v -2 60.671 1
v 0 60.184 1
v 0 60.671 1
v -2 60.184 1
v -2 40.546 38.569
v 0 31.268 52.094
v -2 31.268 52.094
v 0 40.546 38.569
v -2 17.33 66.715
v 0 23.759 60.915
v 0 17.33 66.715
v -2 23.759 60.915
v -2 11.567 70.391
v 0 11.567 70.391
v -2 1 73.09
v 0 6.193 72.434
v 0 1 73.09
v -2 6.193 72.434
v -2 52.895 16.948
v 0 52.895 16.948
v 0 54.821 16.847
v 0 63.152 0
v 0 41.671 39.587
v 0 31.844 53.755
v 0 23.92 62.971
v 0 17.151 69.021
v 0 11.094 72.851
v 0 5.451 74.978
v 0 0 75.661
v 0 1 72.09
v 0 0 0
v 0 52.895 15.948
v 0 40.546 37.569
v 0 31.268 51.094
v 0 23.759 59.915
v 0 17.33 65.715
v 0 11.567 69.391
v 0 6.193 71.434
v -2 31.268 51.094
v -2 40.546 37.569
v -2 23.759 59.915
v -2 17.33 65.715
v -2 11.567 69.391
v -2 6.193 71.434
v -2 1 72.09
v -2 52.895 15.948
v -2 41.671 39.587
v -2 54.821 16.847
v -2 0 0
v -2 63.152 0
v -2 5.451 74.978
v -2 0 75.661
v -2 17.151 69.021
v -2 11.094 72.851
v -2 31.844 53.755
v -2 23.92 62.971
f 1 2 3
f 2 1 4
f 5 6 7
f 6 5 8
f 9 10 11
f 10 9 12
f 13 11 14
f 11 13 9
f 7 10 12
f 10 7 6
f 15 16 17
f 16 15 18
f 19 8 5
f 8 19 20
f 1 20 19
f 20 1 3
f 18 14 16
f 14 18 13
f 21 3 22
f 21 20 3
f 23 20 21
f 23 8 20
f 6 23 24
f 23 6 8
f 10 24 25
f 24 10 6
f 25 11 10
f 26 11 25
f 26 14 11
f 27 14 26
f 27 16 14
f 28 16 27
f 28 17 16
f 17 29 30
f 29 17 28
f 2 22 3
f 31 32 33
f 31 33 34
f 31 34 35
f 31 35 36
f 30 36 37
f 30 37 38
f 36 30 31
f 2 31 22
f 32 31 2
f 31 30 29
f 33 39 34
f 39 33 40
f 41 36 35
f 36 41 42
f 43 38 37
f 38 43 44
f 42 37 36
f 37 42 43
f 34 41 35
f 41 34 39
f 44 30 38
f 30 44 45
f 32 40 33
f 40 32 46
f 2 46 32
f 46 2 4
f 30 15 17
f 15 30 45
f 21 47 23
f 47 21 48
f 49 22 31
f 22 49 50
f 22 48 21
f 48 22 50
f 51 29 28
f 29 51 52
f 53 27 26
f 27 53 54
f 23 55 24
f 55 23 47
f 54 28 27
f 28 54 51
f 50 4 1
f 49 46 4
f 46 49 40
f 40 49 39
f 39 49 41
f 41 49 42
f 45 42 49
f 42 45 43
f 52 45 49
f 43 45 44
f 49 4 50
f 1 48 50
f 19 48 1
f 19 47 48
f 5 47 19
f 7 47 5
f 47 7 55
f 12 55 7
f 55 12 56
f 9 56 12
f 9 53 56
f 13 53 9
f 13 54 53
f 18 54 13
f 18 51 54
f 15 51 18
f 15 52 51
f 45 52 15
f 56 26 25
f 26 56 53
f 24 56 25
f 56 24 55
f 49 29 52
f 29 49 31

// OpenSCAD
// file: ../../lightning-bolt.scad
// Module names are of the form poly_<inkscape-path-id>().  As a result,
// you can associate a polygon in this OpenSCAD program with the corresponding
// SVG element in the Inkscape document by looking for the XML element with
// the attribute id="inkscape-path-id".

// fudge value is used to ensure that subtracted solids are a tad taller
// in the z dimension than the polygon being subtracted from.  This helps
// keep the resulting .stl file manifold.
fudge = 0.1;

module poly_Selection(h)
{
  scale([25.4/90, -25.4/90, 1]) union()
  {
    difference()
    {
       linear_extrude(height=h)
         polygon([[-4.148906,-161.604375],[29.851094,-161.604375],[89.851094,-161.604375],[93.388594,-161.765625],[96.851094,-161.604375],[99.052539,-160.861992],[100.810781,-159.788437],[102.146680,-158.426602],[103.081094,-156.819375],[103.634883,-155.009648],[103.828906,-153.040312],[103.684023,-150.954258],[103.221094,-148.794375],[102.277969,-146.302969],[100.798594,-143.351250],[96.816094,-136.696875],[88.851094,-124.794375],[55.521094,-74.794375],[52.930781,-71.123125],[49.723594,-66.176875],[48.375586,-63.594766],[47.457656,-61.136875],[47.164570,-58.950859],[47.691094,-57.184375],[49.468281,-55.523281],[51.843594,-54.455625],[56.851094,-53.384375],[81.851094,-52.794375],[85.930117,-52.456934],[89.547656,-51.555469],[92.689414,-50.098770],[95.341094,-48.095625],[97.488398,-45.554824],[99.117031,-42.485156],[100.212695,-38.895410],[100.761094,-34.794375],[100.747676,-30.961406],[100.226250,-27.654375],[99.240059,-24.763594],[97.832344,-22.179375],[96.046348,-19.792031],[93.925313,-17.491875],[88.851094,-12.714375],[60.861094,11.495625],[22.681094,53.165625],[-2.148906,76.215625],[-46.148906,121.205625],[-78.148906,152.375625],[-81.104219,155.211094],[-84.541406,158.319375],[-88.282344,160.803281],[-90.211055,161.530723],[-92.148906,161.765625],[-94.372402,161.407539],[-95.966250,160.530312],[-97.010488,159.238242],[-97.585156,157.635625],[-97.770293,155.826758],[-97.645937,153.915937],[-96.788906,150.205625],[-93.919844,142.465000],[-90.396406,134.510625],[-82.908906,119.205625],[-44.898906,43.205625],[-36.378906,25.205625],[-35.345781,22.782813],[-34.608906,20.343125],[-34.494531,17.862187],[-35.328906,15.315625],[-36.170610,14.127329],[-37.254570,13.148945],[-40.029844,11.748437],[-43.415898,10.967148],[-47.173906,10.658125],[-54.850469,10.869062],[-61.148906,11.205625],[-84.148906,11.205625],[-89.537187,11.162031],[-95.852656,10.511875],[-98.777129,9.708848],[-101.236250,8.453594],[-102.997637,6.645918],[-103.544060,5.503611],[-103.828906,4.185625],[-103.551094,0.976250],[-102.416406,-2.454375],[-99.458906,-8.794375],[-87.568906,-34.794375],[-45.288906,-129.794375],[-36.368906,-149.794375],[-33.801406,-154.788125],[-32.116406,-157.068906],[-30.048906,-158.784375],[-27.055781,-159.877500],[-23.293906,-160.479375],[-16.148906,-160.794375],[-10.167656,-160.861875],[-4.148906,-161.604375]]);
       translate([0, 0, -fudge])
         linear_extrude(height=h+2*fudge)
           polygon([[-2.148906,-144.654375],[-11.515156,-143.585625],[-16.058125,-142.526719],[-18.163730,-141.618809],[-20.108906,-140.364375],[-22.284258,-138.120078],[-24.525469,-134.897500],[-28.966406,-126.644375],[-32.953594,-117.858750],[-36.008906,-110.794375],[-65.008906,-46.794375],[-77.008906,-20.794375],[-77.717656,-18.100625],[-78.111406,-14.919375],[-77.953906,-11.783125],[-77.594609,-10.398281],[-77.008906,-9.224375],[-75.949375,-8.181387],[-74.555156,-7.474844],[-71.118906,-6.800625],[-64.148906,-6.514375],[-25.148906,-5.794375],[-20.262344,-5.639844],[-17.686992,-5.320645],[-15.208906,-4.723125],[-12.967070,-3.759512],[-11.100469,-2.342031],[-9.748086,-0.382910],[-9.048906,2.205625],[-9.148008,3.888379],[-9.686094,6.060156],[-11.633906,11.216875],[-15.898906,20.205625],[-36.368906,61.205625],[-43.578906,78.205625],[-43.665156,80.649063],[-43.016406,82.798125],[-42.384766,83.660898],[-41.531406,84.328437],[-40.443672,84.760195],[-39.108906,84.915625],[-36.457187,84.283281],[-33.772656,82.729375],[-29.148906,78.915625],[-9.148906,59.205625],[54.851094,-4.794375],[69.851094,-20.794375],[73.011094,-24.875625],[74.145781,-27.247656],[74.401094,-29.684375],[74.109907,-30.624995],[73.529883,-31.442773],[71.644531,-32.745312],[69.027461,-33.663008],[65.961094,-34.266875],[59.610156,-34.817188],[54.851094,-34.964375],[26.851094,-34.964375],[24.944707,-35.570820],[23.266250,-36.420312],[21.835527,-37.498086],[20.672344,-38.789375],[19.796504,-40.279414],[19.227813,-41.953437],[18.986074,-43.796680],[19.091094,-45.794375],[19.653008,-47.792656],[20.785156,-50.341250],[24.138594,-56.346875],[30.851094,-66.794375],[56.801094,-107.794375],[71.091094,-131.794375],[72.260937,-134.232188],[73.242344,-137.009375],[73.438125,-139.779062],[73.054785,-141.052695],[72.251094,-142.194375],[71.029297,-142.931309],[69.104844,-143.516719],[64.008594,-144.290625],[58.683594,-144.631406],[54.851094,-144.654375],[-2.148906,-144.654375]]);
    }
  }
}

module lightningBolt(height = 1,
                     showBackground = false)
{
    scaleFactor = 0.35;
    scale([scaleFactor, 
          scaleFactor + 0.0, 
           1])
    poly_Selection(height);

    if(showBackground)
    {
        color("green")
        cube([20.6, 32, height], center = true);
    }    
}
// file: ../../O.scad
// Module names are of the form poly_<inkscape-path-id>().  As a result,
// you can associate a polygon in this OpenSCAD program with the corresponding
// SVG element in the Inkscape document by looking for the XML element with
// the attribute id="inkscape-path-id".

// fudge value is used to ensure that subtracted solids are a tad taller
// in the z dimension than the polygon being subtracted from.  This helps
// keep the resulting .stl file manifold.
fudge = 0.1;

module poly_Selection(h)
{
  scale([25.4/90, -25.4/90, 1]) union()
  {
    difference()
    {
       linear_extrude(height=h)
         polygon([[-5.844834,-69.112233],[-0.738835,-69.479330],[4.212842,-69.319479],[8.996970,-68.659091],[13.600322,-67.524576],[18.009670,-65.942347],[22.211787,-63.938815],[26.193445,-61.540389],[29.941416,-58.773483],[33.442473,-55.664506],[36.683389,-52.239869],[39.650935,-48.525985],[42.331885,-44.549264],[44.713010,-40.336117],[46.781084,-35.912955],[48.522878,-31.306190],[49.925166,-26.542233],[51.431885,-20.040983],[52.821416,-12.587233],[53.740322,-5.110983],[53.835166,1.457767],[53.077295,9.616439],[51.953447,17.577767],[50.332021,25.297220],[48.081416,32.730267],[45.070029,39.832377],[41.166260,46.559017],[36.238506,52.865658],[33.349509,55.847562],[30.155166,58.707767],[24.473916,63.186517],[21.457510,65.101986],[18.155166,66.697767],[12.715166,68.386205],[7.297666,69.217767],[1.808916,69.479330],[-3.844834,69.457767],[-7.048369,69.233744],[-10.537490,68.661205],[-17.868584,66.617767],[-24.830303,63.621830],[-27.857705,61.858666],[-30.414834,59.967767],[-33.333330,57.119623],[-36.231553,53.639486],[-39.042354,49.687552],[-41.698584,45.424017],[-46.278740,36.602924],[-49.434834,28.457767],[-51.859893,18.885170],[-53.340303,9.094486],[-53.835166,-0.794869],[-53.303584,-10.663483],[-51.704658,-20.391940],[-48.997490,-29.860826],[-47.215535,-34.460614],[-45.141182,-38.950729],[-42.769319,-43.316244],[-40.094834,-47.542233],[-36.123740,-52.805670],[-31.598584,-57.609733],[-26.509053,-61.787545],[-20.844834,-65.172233],[-17.163740,-66.690670],[-13.491084,-67.727233],[-5.844834,-69.112233]]);
       translate([0, 0, -fudge])
         linear_extrude(height=h+2*fudge)
           polygon([[-5.934834,-61.092233],[-9.446100,-60.339632],[-12.775825,-59.318771],[-18.899951,-56.525162],[-24.325815,-52.817198],[-29.072021,-48.300670],[-33.157173,-43.081368],[-36.599873,-37.265084],[-39.418726,-30.957609],[-41.632334,-24.264733],[-43.259302,-17.292247],[-44.318232,-10.145944],[-44.827729,-2.931613],[-44.806396,4.244955],[-44.272837,11.277968],[-43.245654,18.061635],[-41.743452,24.490165],[-39.784834,30.457767],[-37.048818,36.790424],[-33.822959,42.630892],[-30.065537,47.874174],[-25.734834,52.415267],[-20.789131,56.149174],[-15.186709,58.970892],[-12.126191,60.006869],[-8.885850,60.775424],[-5.460469,61.263431],[-1.844834,61.457767],[2.370159,61.351688],[6.336201,60.937728],[10.062390,60.224178],[13.557822,59.219330],[16.831594,57.931473],[19.892803,56.368900],[22.750544,54.539901],[25.413916,52.452767],[30.193936,47.537260],[34.305635,41.688705],[37.821787,34.973431],[40.815166,27.457767],[42.547073,21.639213],[43.836670,15.417767],[44.669148,8.887885],[45.029697,2.144017],[44.903508,-4.719381],[44.275771,-11.607858],[43.131677,-18.426959],[41.456416,-25.082233],[39.235178,-31.479225],[36.453154,-37.523483],[33.095535,-43.120553],[29.147510,-48.175983],[24.594270,-52.595319],[19.421006,-56.284108],[13.612908,-59.147897],[7.155166,-61.092233],[4.052354,-61.457858],[0.662666,-61.504733],[-5.934834,-61.092233]]);
    }
  }
}

module O(height = 1, showBackground = false)
{
    scaleFactor = 0.82;
    scale([scaleFactor, 
          scaleFactor + 0.02, 
           1])
    poly_Selection(height);

    if(showBackground)
    {
        color("green")
        cube([25, 33, height], center = true);
    }    
}
// file: ../../I.scad
module I(height = 3, showBackground = false)
{
    cube([3, 30, height], center = true);

    if(showBackground)
    {
        color("green")
        cube([3, 30, 1], center = true);
    }
}
// file: ../../G.scad
// Module names are of the form poly_<inkscape-path-id>().  As a result,
// you can associate a polygon in this OpenSCAD program with the corresponding
// SVG element in the Inkscape document by looking for the XML element with
// the attribute id="inkscape-path-id".

// fudge value is used to ensure that subtracted solids are a tad taller
// in the z dimension than the polygon being subtracted from.  This helps
// keep the resulting .stl file manifold.
fudge = 0.1;

module poly_Selection(h)
{
  scale([25.4/90, -25.4/90, 1]) union()
  {
    linear_extrude(height=h)
      polygon([[10.951875,1.338643],[53.951875,1.338643],[57.923281,1.739268],[59.154121,2.231611],[59.983125,2.976143],[60.486348,4.015986],[60.739844,5.394268],[60.801875,9.338643],[60.801875,35.338643],[60.948125,38.736143],[60.801875,42.058643],[59.783262,44.373174],[58.236719,46.904268],[54.065625,52.151143],[49.300156,56.869268],[44.951875,60.128643],[30.951875,66.568643],[26.615156,68.524736],[22.733125,70.007393],[18.710469,70.963174],[13.951875,71.338643],[6.211973,71.338447],[-0.916094,71.050205],[-7.561113,70.334932],[-13.851875,69.053643],[-19.917168,67.067354],[-25.885781,64.237080],[-31.886504,60.423838],[-38.048125,55.488643],[-41.478125,52.521143],[-44.668125,49.298643],[-48.164844,44.410518],[-51.236875,38.836143],[-53.849531,33.003018],[-55.968125,27.338643],[-57.492969,21.081611],[-59.174375,11.797393],[-60.497656,2.533799],[-60.948125,-3.661357],[-60.357676,-10.182725],[-59.158906,-16.957920],[-57.366934,-23.816084],[-54.996875,-30.586357],[-52.063848,-37.097881],[-48.582969,-43.179795],[-44.569355,-48.661240],[-40.038125,-53.371357],[-35.962773,-56.714016],[-31.604531,-59.741221],[-26.997617,-62.442439],[-22.176250,-64.807139],[-17.174648,-66.824788],[-12.027031,-68.484854],[-6.767617,-69.776804],[-1.430625,-70.690107],[3.949727,-71.214231],[9.339219,-71.338643],[14.703633,-71.052810],[20.008750,-70.346201],[25.220352,-69.208284],[30.304219,-67.628525],[35.226133,-65.596394],[39.951875,-63.101357],[45.734375,-59.543857],[50.459375,-55.948857],[52.520234,-53.904092],[54.430625,-51.570107],[56.228516,-48.853623],[57.951875,-45.661357],[54.090625,-43.623857],[51.951406,-42.820732],[50.041875,-42.651357],[49.003926,-42.987490],[48.004531,-43.617295],[46.118125,-45.466357],[42.771875,-49.481357],[40.214844,-51.641357],[37.180625,-53.673857],[30.951875,-56.951357],[27.252129,-58.449600],[23.777031,-59.539795],[17.165625,-60.723857],[10.447344,-60.959170],[2.951875,-60.701357],[-5.044375,-60.340107],[-8.575156,-59.679014],[-13.048125,-58.201357],[-18.547187,-55.967451],[-23.980625,-53.342607],[-29.087813,-50.187139],[-33.608125,-46.361357],[-36.288733,-43.421499],[-38.703457,-40.332959],[-42.767656,-33.761045],[-45.865527,-26.748037],[-48.061875,-19.396357],[-49.421504,-11.808428],[-50.009219,-4.086670],[-49.889824,3.666494],[-49.128125,11.348643],[-47.870469,19.322861],[-46.281875,25.649893],[-43.768906,31.678799],[-39.738125,38.758643],[-37.801875,42.329893],[-36.811719,43.920986],[-35.198125,45.878643],[-30.107051,50.708896],[-24.792031,54.432549],[-19.250371,57.188936],[-13.479375,59.117393],[-7.476348,60.357256],[-1.238594,61.047861],[5.236582,61.328545],[11.951875,61.338643],[16.493691,61.092568],[20.902031,60.463174],[25.166230,59.444951],[29.275625,58.032393],[33.219551,56.219990],[36.987344,54.002236],[40.568340,51.373623],[43.951875,48.328643],[46.745625,45.482080],[48.571875,43.046143],[49.588125,40.253955],[49.951875,36.338643],[50.129531,31.032861],[50.165625,23.922393],[49.960957,20.366279],[49.517344,17.170049],[48.766934,14.604053],[47.641875,12.938643],[45.724375,11.892705],[43.491875,11.433643],[38.951875,11.338643],[10.951875,11.338643],[10.951875,1.338643]]);
  }
}

module G(height = 1,
         showBackground = false)
{
    scaleFactor = 0.698;
    scale([scaleFactor, scaleFactor + 0.042, 1])
    poly_Selection(height);

    if(showBackground)
    {
        color("green")
        cube([24.1, 30, height], center = true);
    }    
}
// file: ../../E.scad
// Module names are of the form poly_<inkscape-path-id>().  As a result,
// you can associate a polygon in this OpenSCAD program with the corresponding
// SVG element in the Inkscape document by looking for the XML element with
// the attribute id="inkscape-path-id".

// fudge value is used to ensure that subtracted solids are a tad taller
// in the z dimension than the polygon being subtracted from.  This helps
// keep the resulting .stl file manifold.
fudge = 0.1;

module poly_Selection(h)
{
  scale([25.4/90, -25.4/90, 1]) union()
  {
    linear_extrude(height=h)
      polygon([[-55.000000,-70.000000],[55.000000,-70.000000],[55.000000,-60.000000],[-43.000000,-60.000000],[-43.000000,-9.000000],[38.000000,-9.000000],[37.985000,-4.623750],[37.696250,-2.316094],[36.980000,-0.600000],[35.692461,0.200879],[33.523438,0.725781],[27.612500,1.156250],[17.000000,1.000000],[-43.000000,1.000000],[-43.000000,52.000000],[-42.823379,54.683281],[-42.389531,56.686875],[-41.673730,58.110156],[-40.651250,59.052500],[-39.297363,59.613281],[-37.587344,59.891875],[-33.000000,60.000000],[55.000000,60.000000],[55.000000,70.000000],[-55.000000,70.000000],[-55.000000,-70.000000]]);
  }
}

module E(height = 1)
{
    scaleFactor = 0.6456;
    scale([scaleFactor, scaleFactor + 0.107, 1])
    poly_Selection(height);

    if(showBackground)
    {
        color("green")
        cube([20.2, 30, height], center = true);
    }    
}

//E(1);
// file: ../../D.scad
// Module names are of the form poly_<inkscape-path-id>().  As a result,
// you can associate a polygon in this OpenSCAD program with the corresponding
// SVG element in the Inkscape document by looking for the XML element with
// the attribute id="inkscape-path-id".

// fudge value is used to ensure that subtracted solids are a tad taller
// in the z dimension than the polygon being subtracted from.  This helps
// keep the resulting .stl file manifold.
fudge = 0.1;

module poly_Selection(h)
{
  scale([25.4/90, -25.4/90, 1]) union()
  {
    difference()
    {
       linear_extrude(height=h)
         polygon([[-138.674375,-159.195000],[-112.964375,-159.975000],[-68.964375,-159.975000],[1.035625,-159.975000],[12.791719,-159.185625],[27.801875,-157.185000],[42.678906,-154.479375],[49.009004,-153.020391],[54.035625,-151.575000],[59.267969,-149.587949],[64.338125,-147.232344],[69.258281,-144.561504],[74.040625,-141.628750],[83.240625,-135.190781],[92.035625,-128.345000],[95.488125,-125.778750],[98.865625,-122.875000],[106.825625,-112.975000],[120.515625,-93.975000],[124.806563,-85.673164],[128.728125,-76.535313],[132.218437,-66.790430],[135.215625,-56.667500],[137.657812,-46.395508],[139.483125,-36.203438],[140.629687,-26.320273],[141.035625,-16.975000],[141.035625,18.025000],[140.242500,27.404531],[138.425625,40.081250],[136.181250,52.729844],[134.105625,62.025000],[131.712031,68.633906],[127.564375,78.716250],[123.174844,88.702969],[120.055625,95.025000],[109.035625,110.025000],[105.698906,114.950000],[102.824375,119.935000],[100.022969,124.515000],[96.905625,128.225000],[92.232500,132.096406],[85.853125,136.831250],[79.282500,141.200469],[74.035625,143.975000],[65.035625,145.865000],[58.035625,149.265000],[42.035625,153.855000],[32.035625,155.305000],[21.599531,156.641250],[13.129375,157.467500],[4.612344,157.892500],[-5.964375,158.025000],[-22.964375,159.025000],[-71.964375,159.025000],[-83.964375,159.975000],[-101.964375,159.975000],[-116.964375,159.025000],[-133.964375,159.025000],[-137.179375,158.847500],[-138.714688,158.386562],[-139.944375,157.425000],[-140.631094,155.877813],[-140.923125,153.875000],[-140.964375,150.025000],[-140.964375,-81.975000],[-140.964375,-138.975000],[-141.035625,-148.698750],[-140.884219,-154.273594],[-140.394375,-157.545000],[-139.433125,-158.760000],[-138.674375,-159.195000]]);
       translate([0, 0, -fudge])
         linear_extrude(height=h+2*fudge)
           polygon([[-113.944375,-141.835000],[-116.077363,-140.651699],[-117.725781,-139.313594],[-118.952559,-137.819629],[-119.820625,-136.168750],[-120.732344,-132.392031],[-120.964375,-127.975000],[-120.964375,-76.975000],[-120.964375,91.025000],[-120.964375,126.025000],[-120.910938,129.017031],[-120.611875,132.103750],[-119.814063,135.046094],[-118.264375,137.605000],[-116.746953,138.960176],[-114.918750,140.007031],[-110.654375,141.333750],[-106.120000,141.901094],[-101.964375,142.025000],[-10.964375,142.025000],[-6.542500,141.911563],[-4.006875,141.590000],[2.035625,140.345000],[12.035625,139.305000],[32.035625,137.685000],[39.086562,135.456250],[50.223125,131.240000],[61.265938,126.716250],[68.035625,123.565000],[72.148750,120.803281],[76.813125,117.191250],[85.035625,109.985000],[91.435312,103.070938],[95.890625,96.747500],[99.618437,90.052812],[103.835625,82.025000],[109.685625,70.708750],[112.467188,64.546719],[114.425625,59.025000],[117.495625,41.025000],[120.286875,25.315000],[121.518906,16.744688],[122.035625,10.025000],[122.035625,-11.975000],[121.543125,-18.151562],[120.368125,-26.295000],[117.695625,-40.975000],[114.445625,-58.975000],[112.575664,-64.567617],[109.955937,-70.903437],[106.751680,-77.686914],[103.128125,-84.622500],[99.250508,-91.414648],[95.284062,-97.767812],[91.394023,-103.386445],[87.745625,-107.975000],[84.119531,-111.698125],[80.314375,-114.907500],[72.035625,-120.805000],[65.931250,-124.894062],[59.605625,-128.707500],[52.995000,-131.962187],[46.035625,-134.375000],[39.035625,-135.765000],[31.035625,-138.595000],[23.481406,-139.695312],[13.786875,-140.430000],[-3.964375,-140.975000],[-20.964375,-141.835000],[-57.964375,-141.835000],[-113.944375,-141.835000]]);
    }
  }
}

module D(h, showBackground = false)
{
    scaleFactor = 0.305;
    scale([scaleFactor, scaleFactor + 0.03, 1])
    poly_Selection(h);

    if(showBackground)
    {
        color("green")
        cube([24.6, 30, 1], center = true);
    }
}

// D(1);
// file: ../../../../../shapes/geometry/arc/projection/parabola.scad
// This was inspired by the post found here:
//	http://forum.openscad.org/Parabolic-tube-tp28894p28897.html

module parabolaProjection(d1=20, h = 30)
{
//    projection(cut=false)
    projection(cut=true)
        rotate([0, 70, 0])
            cylinder(d1=d1, d2=0, h = h);
}

module parabola(d1=20, zExtrude = 50, h = 30)
{
//    linear_extrude(zExtrude)
    difference()
    {
        linear_extrude(zExtrude)
        parabolaProjection(d1=d1, h = h);

        translate([-0.9, 0, -1.0])
        linear_extrude(zExtrude + 2)
        parabolaProjection(d1=d1, h = h);

    //           parabolaProjection();
    }
}
// file: ../../faceplate/letters-symbols-faceplate.scad
use <../D.scad>;
use <../E.scad>;
use <../G.scad>;
use <../I.scad>;
use <../O.scad>;
use <../lightning-bolt.scad>;

LETTER_D = 68;
LETTER_E = 69;
LETTER_G = 71;
LETTER_I = 73;
LETTER_O = 79;

SYMBOL_LIGHTNING_BOLT = 33;

STANDARD_LETTER_HEIGHT = 33; // see the O.scad

module lettersSymbolsFaceplate(horizontalPadding = 10,

                               slot1 = SYMBOL_LIGHTNING_BOLT,
                               slotWidth1 = 20.6,

                               slot2 = LETTER_D,
                               slotWidth2 = 24.6,

                               slot3 = LETTER_I,
                               slotWidth3 = 3,

                               slot4 = LETTER_E,
                               slotWidth4 = 20.2,

                               slot5 = LETTER_G,
                               slotWidth5 = 24.1,

                               slot6 = LETTER_O,
                               slotWidth6 = 25,

                               slot7 = SYMBOL_LIGHTNING_BOLT,
                               slotWidth7 = 20.6,                               

                               verticalPadding = 15,
                               zLength = 2)
{
    difference()
//    union()
    {
        cubeLengthX = horizontalPadding + 
                      slotWidth1 +
                      horizontalPadding + 
                      slotWidth2 +
                      horizontalPadding + 
                      slotWidth3 +
                      horizontalPadding + 
                      slotWidth4 +
                      horizontalPadding +
                      slotWidth5 +
                      horizontalPadding +
                      slotWidth6 +
                      horizontalPadding
                      + 40;

echo("x length: ", cubeLengthX);

        cubeLengthY = verticalPadding + 
                      STANDARD_LETTER_HEIGHT +
                      verticalPadding;                              

        color("green")
        cube(
//             center = true,
             size = [cubeLengthX, cubeLengthY, zLength]);

        letter1TranslateX = horizontalPadding + slotWidth1 / 2.0;
        letterSymbol(letterTranslateX=letter1TranslateX, 
                     slot=slot1, 
                     slotWidth=slotWidth1,
                     verticalPadding = verticalPadding);

        letter2TranslateX = letter1TranslateX + horizontalPadding + slotWidth2 ;
        letterSymbol(letterTranslateX=letter2TranslateX, 
                     slot=slot2, 
                     slotWidth=slotWidth2,
                     verticalPadding = verticalPadding);

        letter3TranslateX = letter2TranslateX + horizontalPadding + slotWidth3 * 5;
        letterSymbol(letterTranslateX=letter3TranslateX, 
                     slot=slot3, 
                     slotWidth=slotWidth3,
                     verticalPadding = verticalPadding);

        letter4TranslateX = letter3TranslateX 
                                    + horizontalPadding * 2
                                    + slotWidth3 ;
        letterSymbol(letterTranslateX=letter4TranslateX, 
                     slot=slot4, 
                     slotWidth=slotWidth4,
                     verticalPadding = verticalPadding);

        letter5TranslateX = letter4TranslateX
                                + horizontalPadding 
                                + slotWidth4;
        letterSymbol(letterTranslateX=letter5TranslateX, 
                     slot=slot5,
                     slotWidth=slotWidth5,
                     verticalPadding = verticalPadding);

        letter6TranslateX = letter5TranslateX
                                + horizontalPadding 
                                + slotWidth5;
        letterSymbol(letterTranslateX=letter6TranslateX, 
                     slot=slot6,
                     slotWidth=slotWidth5,
                     verticalPadding = verticalPadding);

        letter7TranslateX = letter6TranslateX
                                + horizontalPadding 
                                + slotWidth6;
        letterSymbol(letterTranslateX=letter7TranslateX, 
                     slot=slot7,
                     slotWidth=slotWidth7,
                     verticalPadding = verticalPadding);                     
    }
}

module letterSymbol(slot, slotWidth, letterTranslateX,
                    verticalPadding)
{
    letterLengthZ = 10;

//echo("letterTranslateX: ", letterTranslateX);

    letterTranslateY = verticalPadding  + STANDARD_LETTER_HEIGHT / 2.0;

    translate([letterTranslateX, letterTranslateY, -2.01])
    if(slot == SYMBOL_LIGHTNING_BOLT)
    {
        lightningBolt(height = letterLengthZ);
    }
    else if(slot == LETTER_D)
    {
        D(h = letterLengthZ);
    }
    else if(slot == LETTER_E)
    {
        E(height = letterLengthZ);
    }
    else if(slot == LETTER_G)
    {
        G(height = letterLengthZ);
    }
    else if(slot == LETTER_I)
    {
        I(height = letterLengthZ);
    }
    else if(slot == LETTER_O)
    {
        O(height = letterLengthZ);
    }
    else
    {
        echo("no slot id found for: ", slot);
        cube(center = true,
             size = [10, 10, 20]);
    }
}
// main file
use <../../faceplate/letters-symbols-faceplate.scad>

use <../../../../../shapes/geometry/arc/projection/parabola.scad>


//lettersSymbolsFaceplate();

sidePlate();

module sidePlate()
{
    difference()
    {
        
        rotate([0, -90, 0])
        linear_extrude(2.0)
        parabolaProjection(d1 = 127,
                h = 120);

        cubeLengthX = 5;
        cubeLengthY = 70;
        cubeTranslateX = -cubeLengthX / 2.0;
        cubeTranslateY = -cubeLengthY;
        color("purple")
        translate([cubeTranslateX, cubeTranslateY, 0])
        cube(size = [cubeLengthX, cubeLengthY, 150]);                
//    }

    color("red")
    translate([0, 1, 1])
    rotate([0, -90, 0])
    scale([1,1,1])
    sidePlateCutout();
}    
}


module sidePlateCutout()
{
    difference()
    {
        d1 = 120;
        h = 115;
        linear_extrude(2.5)
        parabolaProjection(d1 = d1,
                h = h);

        
        translate([-1,0,0])
        linear_extrude(4)
        parabolaProjection(d1 = d1,
                h = h);

        cutoutLengthX = 5;
        cutoutLengthY = 65;
        cutoutTranslateX = -cutoutLengthX / 2.0;
        cutoutTranslateY = -cutoutLengthY;
        color("black")
        rotate([0, 90, 0])
        translate([cutoutTranslateX, cutoutTranslateY, -2])
        cube(size = [cutoutLengthX, cutoutLengthY, 145]);
    }    
}
